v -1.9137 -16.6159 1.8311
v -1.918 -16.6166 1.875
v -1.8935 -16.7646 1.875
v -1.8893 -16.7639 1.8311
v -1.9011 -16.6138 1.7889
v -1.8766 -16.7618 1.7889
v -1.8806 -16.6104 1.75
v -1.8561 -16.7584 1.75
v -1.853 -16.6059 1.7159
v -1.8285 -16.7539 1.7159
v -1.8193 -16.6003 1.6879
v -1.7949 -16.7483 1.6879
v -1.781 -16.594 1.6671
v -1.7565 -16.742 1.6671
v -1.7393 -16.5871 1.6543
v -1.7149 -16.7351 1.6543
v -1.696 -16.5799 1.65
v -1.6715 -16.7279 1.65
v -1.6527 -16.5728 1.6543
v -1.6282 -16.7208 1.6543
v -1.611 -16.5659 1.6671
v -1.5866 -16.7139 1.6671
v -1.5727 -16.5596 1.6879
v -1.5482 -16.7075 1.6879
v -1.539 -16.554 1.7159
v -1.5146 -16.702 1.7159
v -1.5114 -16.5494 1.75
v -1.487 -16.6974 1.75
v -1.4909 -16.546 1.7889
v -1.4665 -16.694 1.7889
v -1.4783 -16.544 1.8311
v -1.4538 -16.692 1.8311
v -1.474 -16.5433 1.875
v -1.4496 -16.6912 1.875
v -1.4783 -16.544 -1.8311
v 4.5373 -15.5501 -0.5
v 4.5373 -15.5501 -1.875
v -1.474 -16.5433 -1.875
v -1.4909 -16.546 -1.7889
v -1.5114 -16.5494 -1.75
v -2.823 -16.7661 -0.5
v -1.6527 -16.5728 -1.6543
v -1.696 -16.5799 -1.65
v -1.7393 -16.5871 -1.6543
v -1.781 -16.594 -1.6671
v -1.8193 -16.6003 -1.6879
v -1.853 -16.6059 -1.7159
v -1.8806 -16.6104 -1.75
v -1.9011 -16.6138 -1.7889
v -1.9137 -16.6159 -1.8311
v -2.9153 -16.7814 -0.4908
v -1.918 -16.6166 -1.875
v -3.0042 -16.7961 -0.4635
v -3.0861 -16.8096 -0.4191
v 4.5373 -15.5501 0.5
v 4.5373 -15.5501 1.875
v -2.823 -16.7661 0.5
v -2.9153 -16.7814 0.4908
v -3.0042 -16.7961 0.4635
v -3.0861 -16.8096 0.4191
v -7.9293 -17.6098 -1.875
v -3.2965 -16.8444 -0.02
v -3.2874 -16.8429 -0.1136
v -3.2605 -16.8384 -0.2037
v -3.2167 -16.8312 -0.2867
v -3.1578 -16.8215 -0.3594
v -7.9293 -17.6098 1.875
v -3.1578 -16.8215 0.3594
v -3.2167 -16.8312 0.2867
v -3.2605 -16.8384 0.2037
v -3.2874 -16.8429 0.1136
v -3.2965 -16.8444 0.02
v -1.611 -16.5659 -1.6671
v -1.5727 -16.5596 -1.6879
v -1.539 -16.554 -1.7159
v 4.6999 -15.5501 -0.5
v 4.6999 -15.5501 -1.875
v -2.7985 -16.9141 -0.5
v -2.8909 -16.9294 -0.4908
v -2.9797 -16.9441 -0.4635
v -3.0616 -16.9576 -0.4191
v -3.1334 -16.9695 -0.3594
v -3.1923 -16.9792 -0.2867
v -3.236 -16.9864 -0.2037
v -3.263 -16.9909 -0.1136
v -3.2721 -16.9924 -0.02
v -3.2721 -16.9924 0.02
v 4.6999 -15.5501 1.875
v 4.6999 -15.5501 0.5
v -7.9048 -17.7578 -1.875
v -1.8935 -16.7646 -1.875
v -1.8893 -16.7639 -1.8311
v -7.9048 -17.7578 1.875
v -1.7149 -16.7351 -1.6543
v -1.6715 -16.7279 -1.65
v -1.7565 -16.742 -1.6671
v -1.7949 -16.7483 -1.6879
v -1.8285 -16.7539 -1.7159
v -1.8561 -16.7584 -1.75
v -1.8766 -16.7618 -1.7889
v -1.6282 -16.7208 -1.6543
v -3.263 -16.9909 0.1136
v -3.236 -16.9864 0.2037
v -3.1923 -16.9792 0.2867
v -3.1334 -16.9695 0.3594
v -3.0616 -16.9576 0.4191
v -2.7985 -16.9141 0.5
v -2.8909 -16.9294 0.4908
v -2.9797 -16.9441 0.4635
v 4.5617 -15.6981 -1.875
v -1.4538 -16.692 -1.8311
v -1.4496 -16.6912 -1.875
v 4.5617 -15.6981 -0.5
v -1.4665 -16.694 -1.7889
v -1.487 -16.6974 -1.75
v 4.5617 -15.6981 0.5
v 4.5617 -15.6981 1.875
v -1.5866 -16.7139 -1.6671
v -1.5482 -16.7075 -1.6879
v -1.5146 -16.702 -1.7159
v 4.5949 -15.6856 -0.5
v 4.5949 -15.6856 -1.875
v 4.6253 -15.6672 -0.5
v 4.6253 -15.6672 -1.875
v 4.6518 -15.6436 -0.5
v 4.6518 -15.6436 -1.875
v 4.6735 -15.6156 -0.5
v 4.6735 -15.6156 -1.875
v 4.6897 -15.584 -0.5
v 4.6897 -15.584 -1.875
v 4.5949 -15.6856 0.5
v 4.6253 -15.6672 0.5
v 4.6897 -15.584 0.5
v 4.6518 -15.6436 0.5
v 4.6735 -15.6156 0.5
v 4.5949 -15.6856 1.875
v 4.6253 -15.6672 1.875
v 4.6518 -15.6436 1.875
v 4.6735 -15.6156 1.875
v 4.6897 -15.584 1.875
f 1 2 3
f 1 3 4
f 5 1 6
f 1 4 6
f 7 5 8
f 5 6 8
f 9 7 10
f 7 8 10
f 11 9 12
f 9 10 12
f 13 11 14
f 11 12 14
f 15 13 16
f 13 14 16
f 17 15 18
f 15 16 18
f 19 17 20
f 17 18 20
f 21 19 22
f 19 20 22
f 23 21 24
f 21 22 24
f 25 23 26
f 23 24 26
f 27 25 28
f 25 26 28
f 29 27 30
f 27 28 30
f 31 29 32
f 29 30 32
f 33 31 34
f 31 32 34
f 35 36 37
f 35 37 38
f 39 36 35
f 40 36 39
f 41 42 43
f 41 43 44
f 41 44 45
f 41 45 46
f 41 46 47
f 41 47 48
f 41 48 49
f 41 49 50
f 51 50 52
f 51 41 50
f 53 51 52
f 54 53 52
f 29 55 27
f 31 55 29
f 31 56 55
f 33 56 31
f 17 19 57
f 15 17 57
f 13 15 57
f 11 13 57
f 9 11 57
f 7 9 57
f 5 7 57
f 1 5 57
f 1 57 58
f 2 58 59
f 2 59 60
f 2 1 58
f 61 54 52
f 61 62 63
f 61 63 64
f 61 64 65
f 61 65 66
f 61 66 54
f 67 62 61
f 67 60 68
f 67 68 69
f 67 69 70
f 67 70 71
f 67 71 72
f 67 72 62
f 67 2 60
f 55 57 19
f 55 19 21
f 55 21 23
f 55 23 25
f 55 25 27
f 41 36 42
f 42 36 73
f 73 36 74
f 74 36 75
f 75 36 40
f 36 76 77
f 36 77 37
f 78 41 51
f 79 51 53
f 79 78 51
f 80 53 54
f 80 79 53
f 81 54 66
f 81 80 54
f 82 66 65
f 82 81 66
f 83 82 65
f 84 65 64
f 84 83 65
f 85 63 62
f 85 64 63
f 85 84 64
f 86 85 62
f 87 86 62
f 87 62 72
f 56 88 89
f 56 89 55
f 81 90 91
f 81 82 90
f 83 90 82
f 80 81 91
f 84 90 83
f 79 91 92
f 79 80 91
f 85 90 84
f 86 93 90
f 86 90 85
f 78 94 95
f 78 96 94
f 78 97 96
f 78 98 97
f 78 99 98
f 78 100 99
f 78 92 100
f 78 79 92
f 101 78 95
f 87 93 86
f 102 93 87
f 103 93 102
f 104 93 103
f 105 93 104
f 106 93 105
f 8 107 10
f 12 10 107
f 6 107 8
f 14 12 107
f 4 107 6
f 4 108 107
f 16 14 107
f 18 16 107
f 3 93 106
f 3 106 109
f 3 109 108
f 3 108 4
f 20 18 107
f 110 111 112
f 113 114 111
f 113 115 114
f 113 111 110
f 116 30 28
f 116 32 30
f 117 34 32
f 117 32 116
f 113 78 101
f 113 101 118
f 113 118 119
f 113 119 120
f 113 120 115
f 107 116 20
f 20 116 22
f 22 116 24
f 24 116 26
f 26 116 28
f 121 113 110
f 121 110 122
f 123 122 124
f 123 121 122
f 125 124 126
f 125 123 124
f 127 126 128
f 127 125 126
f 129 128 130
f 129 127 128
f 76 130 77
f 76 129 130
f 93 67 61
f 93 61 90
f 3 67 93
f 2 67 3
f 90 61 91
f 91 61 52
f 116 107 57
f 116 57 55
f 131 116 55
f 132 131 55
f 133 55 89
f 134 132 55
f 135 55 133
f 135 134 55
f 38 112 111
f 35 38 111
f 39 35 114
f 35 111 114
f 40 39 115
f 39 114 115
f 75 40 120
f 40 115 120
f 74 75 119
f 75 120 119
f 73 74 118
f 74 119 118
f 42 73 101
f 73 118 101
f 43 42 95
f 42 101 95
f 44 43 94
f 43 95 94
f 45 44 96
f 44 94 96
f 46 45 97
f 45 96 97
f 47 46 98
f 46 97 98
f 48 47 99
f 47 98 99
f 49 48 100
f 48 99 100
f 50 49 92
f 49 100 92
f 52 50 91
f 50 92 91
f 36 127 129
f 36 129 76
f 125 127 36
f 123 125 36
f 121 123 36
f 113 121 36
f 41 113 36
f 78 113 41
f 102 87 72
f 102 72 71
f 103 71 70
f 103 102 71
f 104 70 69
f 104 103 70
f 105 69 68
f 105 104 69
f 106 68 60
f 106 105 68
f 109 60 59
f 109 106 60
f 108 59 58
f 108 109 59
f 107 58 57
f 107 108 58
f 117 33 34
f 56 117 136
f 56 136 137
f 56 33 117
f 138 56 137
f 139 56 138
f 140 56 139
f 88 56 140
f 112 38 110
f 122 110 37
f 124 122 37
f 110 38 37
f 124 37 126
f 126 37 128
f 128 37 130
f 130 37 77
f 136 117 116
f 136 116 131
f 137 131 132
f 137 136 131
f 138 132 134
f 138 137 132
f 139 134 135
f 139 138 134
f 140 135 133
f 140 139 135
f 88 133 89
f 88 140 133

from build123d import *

# Parameters (mm, degrees)
SALIENTE_EXTRUIR1_DEPTH = 1.875
CROQUIS2_R              = 0.225
CORTAR_EXTRUIR1_DEPTH   = 0.3


with BuildPart() as part:
    # Croquis1 → Saliente-Extruir1 (new, symmetric)
    with BuildSketch(Plane.XY):
        with BuildLine():
            Line((4.537261216, -15.5500625), (-7.929262831, -17.609800574))
            Line((-7.929262831, -17.609800574), (-7.9048111, -17.757794198))
            Line((-7.9048111, -17.757794198), (4.561712947, -15.698056124))
            ThreePointArc((4.561712947, -15.698056124), (4.651774684, -15.643632038), (4.699918625, -15.5500625))
            Line((4.699918625, -15.5500625), (4.537261216, -15.5500625))
        make_face()
    extrude(amount=SALIENTE_EXTRUIR1_DEPTH, both=True)

    # Croquis2 → Cortar-Extruir1 (cut)
    with BuildSketch(Plane(origin=(2.645953415, -16.01458083, 0), x_dir=(0.9866241615125322, 0.16301154535704834, 0), z_dir=(0.16301154535704834, -0.9866241615125322, 0))):
        with Locations((-4.376035637, 1.875)):
            Circle(CROQUIS2_R)
        with Locations((-4.376035637, -1.875)):
            Circle(CROQUIS2_R)
        with BuildLine():
            Line((9.881731824, -0.5), (-5.518268176, -0.5))
            ThreePointArc((-5.518268176, -0.5), (-5.857679431, -0.359411255), (-5.998268176, -0.02))
            Line((-5.998268176, -0.02), (-5.998268176, 0.02))
            ThreePointArc((-5.998268176, 0.02), (-5.857679431, 0.359411255), (-5.518268176, 0.5))
            Line((-5.518268176, 0.5), (9.881731824, 0.5))
            Line((9.881731824, 0.5), (9.881731824, -0.5))
        make_face()
    extrude(amount=-CORTAR_EXTRUIR1_DEPTH, mode=Mode.SUBTRACT)


solid = part.part
